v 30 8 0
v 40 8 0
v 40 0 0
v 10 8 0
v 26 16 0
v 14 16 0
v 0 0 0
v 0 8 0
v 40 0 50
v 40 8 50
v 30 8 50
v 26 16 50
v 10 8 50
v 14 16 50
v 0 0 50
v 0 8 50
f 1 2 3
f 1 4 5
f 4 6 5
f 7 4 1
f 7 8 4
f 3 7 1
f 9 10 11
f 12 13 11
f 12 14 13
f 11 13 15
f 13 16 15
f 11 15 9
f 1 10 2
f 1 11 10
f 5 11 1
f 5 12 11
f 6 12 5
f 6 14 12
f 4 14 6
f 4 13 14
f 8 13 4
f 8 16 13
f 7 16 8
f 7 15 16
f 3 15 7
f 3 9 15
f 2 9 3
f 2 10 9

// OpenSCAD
$fn = 32;

// ----------------------------------------------------------------------
// V guide rail: dovetail, 40 mm wide
// ----------------------------------------------------------------------

// --- parameters (mm) ---
rail_w = 40;              // rail width, X
base_t = 8;               // base plate thickness
v_depth = 8;              // V feature depth / height
v_half_w = 10;            // half width of the V at the base face
plate_t = 50;             // rail length, Z (the extrusion height)
top_half_w = 6;           // half width at the dovetail top

dovetail_base = 2 * v_half_w;  // dovetail width at the base
dovetail_top = 2 * top_half_w;  // dovetail width at the top

profile = [[0, 0], [40, 0], [40, 8], [30, 8], [26, 16], [14, 16], [10, 8], [0, 8]];  // primary outline, 8 points, counter clockwise

// --- the one profile operation ---
linear_extrude(height = plate_t) polygon(points = profile);
